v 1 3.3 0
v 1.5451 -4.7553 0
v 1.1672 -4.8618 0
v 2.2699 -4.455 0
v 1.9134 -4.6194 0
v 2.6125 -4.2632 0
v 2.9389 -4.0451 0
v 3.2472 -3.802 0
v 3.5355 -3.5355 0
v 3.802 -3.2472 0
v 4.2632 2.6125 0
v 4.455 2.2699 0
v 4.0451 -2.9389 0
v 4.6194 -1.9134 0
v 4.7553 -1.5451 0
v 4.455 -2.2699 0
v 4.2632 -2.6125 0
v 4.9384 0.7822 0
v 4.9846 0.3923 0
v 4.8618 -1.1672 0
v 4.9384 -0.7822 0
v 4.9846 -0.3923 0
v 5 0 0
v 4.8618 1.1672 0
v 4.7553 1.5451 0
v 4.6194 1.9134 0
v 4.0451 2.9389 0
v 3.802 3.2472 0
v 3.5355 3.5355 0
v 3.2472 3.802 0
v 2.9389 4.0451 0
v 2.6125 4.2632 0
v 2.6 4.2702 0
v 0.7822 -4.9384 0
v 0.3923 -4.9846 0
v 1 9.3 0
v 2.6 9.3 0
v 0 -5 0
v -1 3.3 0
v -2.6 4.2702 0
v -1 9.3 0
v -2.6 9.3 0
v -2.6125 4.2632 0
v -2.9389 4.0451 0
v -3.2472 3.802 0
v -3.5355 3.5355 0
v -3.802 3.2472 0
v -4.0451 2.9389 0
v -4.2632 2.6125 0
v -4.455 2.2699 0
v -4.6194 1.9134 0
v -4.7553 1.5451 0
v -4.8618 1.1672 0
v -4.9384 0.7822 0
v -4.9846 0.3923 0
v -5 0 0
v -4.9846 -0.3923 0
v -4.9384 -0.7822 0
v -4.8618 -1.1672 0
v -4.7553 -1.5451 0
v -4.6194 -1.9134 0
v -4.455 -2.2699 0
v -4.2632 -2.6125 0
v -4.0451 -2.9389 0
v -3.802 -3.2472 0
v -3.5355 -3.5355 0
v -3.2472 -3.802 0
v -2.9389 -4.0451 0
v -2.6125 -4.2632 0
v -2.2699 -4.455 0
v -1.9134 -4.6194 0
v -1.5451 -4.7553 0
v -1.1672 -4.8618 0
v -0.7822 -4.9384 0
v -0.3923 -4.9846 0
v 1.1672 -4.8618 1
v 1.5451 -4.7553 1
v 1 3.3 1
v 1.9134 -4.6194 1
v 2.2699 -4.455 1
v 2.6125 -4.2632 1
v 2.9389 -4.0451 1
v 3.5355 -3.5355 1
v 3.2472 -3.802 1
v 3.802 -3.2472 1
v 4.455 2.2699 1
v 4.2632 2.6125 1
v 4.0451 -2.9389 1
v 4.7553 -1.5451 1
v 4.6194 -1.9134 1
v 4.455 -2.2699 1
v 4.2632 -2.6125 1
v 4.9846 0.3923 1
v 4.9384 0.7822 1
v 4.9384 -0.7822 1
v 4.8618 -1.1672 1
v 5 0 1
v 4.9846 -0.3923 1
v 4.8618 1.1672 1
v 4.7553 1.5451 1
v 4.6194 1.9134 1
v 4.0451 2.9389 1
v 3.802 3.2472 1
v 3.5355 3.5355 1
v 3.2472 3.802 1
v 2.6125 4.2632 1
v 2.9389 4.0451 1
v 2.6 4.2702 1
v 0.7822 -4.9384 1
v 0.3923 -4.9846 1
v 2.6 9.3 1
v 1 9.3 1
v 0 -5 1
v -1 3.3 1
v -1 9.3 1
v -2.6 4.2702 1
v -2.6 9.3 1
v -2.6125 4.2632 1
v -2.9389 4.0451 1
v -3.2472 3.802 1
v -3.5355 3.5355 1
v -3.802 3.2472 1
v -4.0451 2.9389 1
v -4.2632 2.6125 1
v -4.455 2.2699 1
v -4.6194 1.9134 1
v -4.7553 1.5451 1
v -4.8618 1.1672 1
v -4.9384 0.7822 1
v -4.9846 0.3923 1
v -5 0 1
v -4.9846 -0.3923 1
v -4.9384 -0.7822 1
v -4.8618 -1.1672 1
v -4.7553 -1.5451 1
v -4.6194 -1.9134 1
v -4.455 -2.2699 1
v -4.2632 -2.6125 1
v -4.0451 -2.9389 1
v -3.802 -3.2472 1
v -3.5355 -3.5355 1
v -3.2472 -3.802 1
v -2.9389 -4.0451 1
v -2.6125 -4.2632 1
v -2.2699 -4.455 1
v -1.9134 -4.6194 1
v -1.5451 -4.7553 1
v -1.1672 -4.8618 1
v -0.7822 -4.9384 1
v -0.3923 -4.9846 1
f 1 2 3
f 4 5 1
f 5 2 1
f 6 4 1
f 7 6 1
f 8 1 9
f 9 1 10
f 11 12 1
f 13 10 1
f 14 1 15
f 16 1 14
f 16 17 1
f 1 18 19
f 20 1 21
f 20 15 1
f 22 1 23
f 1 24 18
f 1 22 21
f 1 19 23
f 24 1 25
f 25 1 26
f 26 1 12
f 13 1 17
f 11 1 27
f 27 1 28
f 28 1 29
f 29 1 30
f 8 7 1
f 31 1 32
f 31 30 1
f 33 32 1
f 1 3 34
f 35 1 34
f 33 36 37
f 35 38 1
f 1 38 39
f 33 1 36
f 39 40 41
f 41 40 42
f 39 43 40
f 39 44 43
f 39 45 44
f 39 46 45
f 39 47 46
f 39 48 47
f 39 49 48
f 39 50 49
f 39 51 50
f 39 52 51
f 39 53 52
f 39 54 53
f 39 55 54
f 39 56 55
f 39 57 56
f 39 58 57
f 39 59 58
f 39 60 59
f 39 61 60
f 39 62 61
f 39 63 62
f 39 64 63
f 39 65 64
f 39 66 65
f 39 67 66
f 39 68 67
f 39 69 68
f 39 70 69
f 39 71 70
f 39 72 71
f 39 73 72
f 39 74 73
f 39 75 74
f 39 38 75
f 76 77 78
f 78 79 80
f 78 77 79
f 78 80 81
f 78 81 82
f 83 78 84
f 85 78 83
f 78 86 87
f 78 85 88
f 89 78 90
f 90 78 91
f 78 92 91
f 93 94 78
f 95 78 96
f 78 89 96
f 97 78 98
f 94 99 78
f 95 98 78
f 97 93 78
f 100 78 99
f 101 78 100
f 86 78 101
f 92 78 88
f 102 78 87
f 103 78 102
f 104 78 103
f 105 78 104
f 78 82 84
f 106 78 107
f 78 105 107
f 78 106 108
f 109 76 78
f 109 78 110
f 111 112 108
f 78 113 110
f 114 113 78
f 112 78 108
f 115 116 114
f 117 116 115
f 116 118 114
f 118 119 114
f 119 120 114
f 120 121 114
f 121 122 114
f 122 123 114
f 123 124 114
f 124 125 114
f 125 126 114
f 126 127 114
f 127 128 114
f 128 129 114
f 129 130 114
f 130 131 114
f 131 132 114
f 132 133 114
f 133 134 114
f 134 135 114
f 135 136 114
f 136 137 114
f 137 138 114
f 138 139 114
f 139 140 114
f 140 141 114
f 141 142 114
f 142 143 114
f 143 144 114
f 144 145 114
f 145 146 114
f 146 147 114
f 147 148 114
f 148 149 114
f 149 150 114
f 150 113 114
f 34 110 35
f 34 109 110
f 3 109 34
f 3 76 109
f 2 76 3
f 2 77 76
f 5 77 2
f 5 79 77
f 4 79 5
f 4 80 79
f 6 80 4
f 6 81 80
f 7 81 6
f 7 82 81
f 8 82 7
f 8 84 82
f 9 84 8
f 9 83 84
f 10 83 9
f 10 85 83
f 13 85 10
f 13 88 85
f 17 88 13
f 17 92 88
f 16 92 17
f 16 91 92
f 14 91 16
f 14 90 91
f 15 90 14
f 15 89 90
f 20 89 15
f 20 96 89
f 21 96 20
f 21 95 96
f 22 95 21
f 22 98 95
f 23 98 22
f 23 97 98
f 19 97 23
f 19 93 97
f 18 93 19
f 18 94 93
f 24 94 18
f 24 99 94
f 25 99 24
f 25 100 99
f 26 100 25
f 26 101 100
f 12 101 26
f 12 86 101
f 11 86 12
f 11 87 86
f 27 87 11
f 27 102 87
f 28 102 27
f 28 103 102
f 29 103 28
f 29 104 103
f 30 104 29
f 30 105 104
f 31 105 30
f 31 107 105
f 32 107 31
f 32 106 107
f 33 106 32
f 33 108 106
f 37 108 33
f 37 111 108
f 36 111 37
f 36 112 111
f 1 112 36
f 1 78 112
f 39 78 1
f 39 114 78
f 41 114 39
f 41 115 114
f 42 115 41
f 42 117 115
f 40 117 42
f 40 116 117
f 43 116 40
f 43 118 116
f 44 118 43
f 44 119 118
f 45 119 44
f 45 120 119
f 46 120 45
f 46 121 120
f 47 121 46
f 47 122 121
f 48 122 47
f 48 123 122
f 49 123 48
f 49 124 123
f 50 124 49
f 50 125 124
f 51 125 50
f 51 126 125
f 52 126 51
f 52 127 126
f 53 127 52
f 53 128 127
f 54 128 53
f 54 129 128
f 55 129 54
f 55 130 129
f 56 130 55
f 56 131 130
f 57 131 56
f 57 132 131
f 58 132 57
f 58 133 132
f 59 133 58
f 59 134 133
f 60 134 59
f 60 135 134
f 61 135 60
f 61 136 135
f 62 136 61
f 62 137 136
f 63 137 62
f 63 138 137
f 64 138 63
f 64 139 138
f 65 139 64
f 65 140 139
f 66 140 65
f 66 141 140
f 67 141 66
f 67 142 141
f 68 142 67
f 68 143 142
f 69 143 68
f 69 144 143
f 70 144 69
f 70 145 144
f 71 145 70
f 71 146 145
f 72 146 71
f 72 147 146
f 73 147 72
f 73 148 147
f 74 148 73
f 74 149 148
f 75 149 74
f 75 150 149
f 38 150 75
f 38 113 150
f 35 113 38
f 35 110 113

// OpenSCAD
// part_id: cp-f4
// name: Fork 2W 8D 8L 7T
// source_drawing_ids: DRW-005
// units: mm
// revision: 0.1
// SPDX-License-Identifier: MIT

module cpf4_profile_2d() {
    difference() {
        union() {
            circle(r = 5.0, $fn = 80);
            translate([0, 5.3]) square([5.2, 8.0], center = true);
        }
        translate([0, 7.3]) square([2.0, 8.0], center = true);
    }
}

module part_cpf4(th = 1.0) {
    linear_extrude(height = th) cpf4_profile_2d();
}

// ---- "main guard" ----
// Default to previewing when opened directly:
if (is_undef(__LIB_MODE__)) {
    part_cpf4();
}
